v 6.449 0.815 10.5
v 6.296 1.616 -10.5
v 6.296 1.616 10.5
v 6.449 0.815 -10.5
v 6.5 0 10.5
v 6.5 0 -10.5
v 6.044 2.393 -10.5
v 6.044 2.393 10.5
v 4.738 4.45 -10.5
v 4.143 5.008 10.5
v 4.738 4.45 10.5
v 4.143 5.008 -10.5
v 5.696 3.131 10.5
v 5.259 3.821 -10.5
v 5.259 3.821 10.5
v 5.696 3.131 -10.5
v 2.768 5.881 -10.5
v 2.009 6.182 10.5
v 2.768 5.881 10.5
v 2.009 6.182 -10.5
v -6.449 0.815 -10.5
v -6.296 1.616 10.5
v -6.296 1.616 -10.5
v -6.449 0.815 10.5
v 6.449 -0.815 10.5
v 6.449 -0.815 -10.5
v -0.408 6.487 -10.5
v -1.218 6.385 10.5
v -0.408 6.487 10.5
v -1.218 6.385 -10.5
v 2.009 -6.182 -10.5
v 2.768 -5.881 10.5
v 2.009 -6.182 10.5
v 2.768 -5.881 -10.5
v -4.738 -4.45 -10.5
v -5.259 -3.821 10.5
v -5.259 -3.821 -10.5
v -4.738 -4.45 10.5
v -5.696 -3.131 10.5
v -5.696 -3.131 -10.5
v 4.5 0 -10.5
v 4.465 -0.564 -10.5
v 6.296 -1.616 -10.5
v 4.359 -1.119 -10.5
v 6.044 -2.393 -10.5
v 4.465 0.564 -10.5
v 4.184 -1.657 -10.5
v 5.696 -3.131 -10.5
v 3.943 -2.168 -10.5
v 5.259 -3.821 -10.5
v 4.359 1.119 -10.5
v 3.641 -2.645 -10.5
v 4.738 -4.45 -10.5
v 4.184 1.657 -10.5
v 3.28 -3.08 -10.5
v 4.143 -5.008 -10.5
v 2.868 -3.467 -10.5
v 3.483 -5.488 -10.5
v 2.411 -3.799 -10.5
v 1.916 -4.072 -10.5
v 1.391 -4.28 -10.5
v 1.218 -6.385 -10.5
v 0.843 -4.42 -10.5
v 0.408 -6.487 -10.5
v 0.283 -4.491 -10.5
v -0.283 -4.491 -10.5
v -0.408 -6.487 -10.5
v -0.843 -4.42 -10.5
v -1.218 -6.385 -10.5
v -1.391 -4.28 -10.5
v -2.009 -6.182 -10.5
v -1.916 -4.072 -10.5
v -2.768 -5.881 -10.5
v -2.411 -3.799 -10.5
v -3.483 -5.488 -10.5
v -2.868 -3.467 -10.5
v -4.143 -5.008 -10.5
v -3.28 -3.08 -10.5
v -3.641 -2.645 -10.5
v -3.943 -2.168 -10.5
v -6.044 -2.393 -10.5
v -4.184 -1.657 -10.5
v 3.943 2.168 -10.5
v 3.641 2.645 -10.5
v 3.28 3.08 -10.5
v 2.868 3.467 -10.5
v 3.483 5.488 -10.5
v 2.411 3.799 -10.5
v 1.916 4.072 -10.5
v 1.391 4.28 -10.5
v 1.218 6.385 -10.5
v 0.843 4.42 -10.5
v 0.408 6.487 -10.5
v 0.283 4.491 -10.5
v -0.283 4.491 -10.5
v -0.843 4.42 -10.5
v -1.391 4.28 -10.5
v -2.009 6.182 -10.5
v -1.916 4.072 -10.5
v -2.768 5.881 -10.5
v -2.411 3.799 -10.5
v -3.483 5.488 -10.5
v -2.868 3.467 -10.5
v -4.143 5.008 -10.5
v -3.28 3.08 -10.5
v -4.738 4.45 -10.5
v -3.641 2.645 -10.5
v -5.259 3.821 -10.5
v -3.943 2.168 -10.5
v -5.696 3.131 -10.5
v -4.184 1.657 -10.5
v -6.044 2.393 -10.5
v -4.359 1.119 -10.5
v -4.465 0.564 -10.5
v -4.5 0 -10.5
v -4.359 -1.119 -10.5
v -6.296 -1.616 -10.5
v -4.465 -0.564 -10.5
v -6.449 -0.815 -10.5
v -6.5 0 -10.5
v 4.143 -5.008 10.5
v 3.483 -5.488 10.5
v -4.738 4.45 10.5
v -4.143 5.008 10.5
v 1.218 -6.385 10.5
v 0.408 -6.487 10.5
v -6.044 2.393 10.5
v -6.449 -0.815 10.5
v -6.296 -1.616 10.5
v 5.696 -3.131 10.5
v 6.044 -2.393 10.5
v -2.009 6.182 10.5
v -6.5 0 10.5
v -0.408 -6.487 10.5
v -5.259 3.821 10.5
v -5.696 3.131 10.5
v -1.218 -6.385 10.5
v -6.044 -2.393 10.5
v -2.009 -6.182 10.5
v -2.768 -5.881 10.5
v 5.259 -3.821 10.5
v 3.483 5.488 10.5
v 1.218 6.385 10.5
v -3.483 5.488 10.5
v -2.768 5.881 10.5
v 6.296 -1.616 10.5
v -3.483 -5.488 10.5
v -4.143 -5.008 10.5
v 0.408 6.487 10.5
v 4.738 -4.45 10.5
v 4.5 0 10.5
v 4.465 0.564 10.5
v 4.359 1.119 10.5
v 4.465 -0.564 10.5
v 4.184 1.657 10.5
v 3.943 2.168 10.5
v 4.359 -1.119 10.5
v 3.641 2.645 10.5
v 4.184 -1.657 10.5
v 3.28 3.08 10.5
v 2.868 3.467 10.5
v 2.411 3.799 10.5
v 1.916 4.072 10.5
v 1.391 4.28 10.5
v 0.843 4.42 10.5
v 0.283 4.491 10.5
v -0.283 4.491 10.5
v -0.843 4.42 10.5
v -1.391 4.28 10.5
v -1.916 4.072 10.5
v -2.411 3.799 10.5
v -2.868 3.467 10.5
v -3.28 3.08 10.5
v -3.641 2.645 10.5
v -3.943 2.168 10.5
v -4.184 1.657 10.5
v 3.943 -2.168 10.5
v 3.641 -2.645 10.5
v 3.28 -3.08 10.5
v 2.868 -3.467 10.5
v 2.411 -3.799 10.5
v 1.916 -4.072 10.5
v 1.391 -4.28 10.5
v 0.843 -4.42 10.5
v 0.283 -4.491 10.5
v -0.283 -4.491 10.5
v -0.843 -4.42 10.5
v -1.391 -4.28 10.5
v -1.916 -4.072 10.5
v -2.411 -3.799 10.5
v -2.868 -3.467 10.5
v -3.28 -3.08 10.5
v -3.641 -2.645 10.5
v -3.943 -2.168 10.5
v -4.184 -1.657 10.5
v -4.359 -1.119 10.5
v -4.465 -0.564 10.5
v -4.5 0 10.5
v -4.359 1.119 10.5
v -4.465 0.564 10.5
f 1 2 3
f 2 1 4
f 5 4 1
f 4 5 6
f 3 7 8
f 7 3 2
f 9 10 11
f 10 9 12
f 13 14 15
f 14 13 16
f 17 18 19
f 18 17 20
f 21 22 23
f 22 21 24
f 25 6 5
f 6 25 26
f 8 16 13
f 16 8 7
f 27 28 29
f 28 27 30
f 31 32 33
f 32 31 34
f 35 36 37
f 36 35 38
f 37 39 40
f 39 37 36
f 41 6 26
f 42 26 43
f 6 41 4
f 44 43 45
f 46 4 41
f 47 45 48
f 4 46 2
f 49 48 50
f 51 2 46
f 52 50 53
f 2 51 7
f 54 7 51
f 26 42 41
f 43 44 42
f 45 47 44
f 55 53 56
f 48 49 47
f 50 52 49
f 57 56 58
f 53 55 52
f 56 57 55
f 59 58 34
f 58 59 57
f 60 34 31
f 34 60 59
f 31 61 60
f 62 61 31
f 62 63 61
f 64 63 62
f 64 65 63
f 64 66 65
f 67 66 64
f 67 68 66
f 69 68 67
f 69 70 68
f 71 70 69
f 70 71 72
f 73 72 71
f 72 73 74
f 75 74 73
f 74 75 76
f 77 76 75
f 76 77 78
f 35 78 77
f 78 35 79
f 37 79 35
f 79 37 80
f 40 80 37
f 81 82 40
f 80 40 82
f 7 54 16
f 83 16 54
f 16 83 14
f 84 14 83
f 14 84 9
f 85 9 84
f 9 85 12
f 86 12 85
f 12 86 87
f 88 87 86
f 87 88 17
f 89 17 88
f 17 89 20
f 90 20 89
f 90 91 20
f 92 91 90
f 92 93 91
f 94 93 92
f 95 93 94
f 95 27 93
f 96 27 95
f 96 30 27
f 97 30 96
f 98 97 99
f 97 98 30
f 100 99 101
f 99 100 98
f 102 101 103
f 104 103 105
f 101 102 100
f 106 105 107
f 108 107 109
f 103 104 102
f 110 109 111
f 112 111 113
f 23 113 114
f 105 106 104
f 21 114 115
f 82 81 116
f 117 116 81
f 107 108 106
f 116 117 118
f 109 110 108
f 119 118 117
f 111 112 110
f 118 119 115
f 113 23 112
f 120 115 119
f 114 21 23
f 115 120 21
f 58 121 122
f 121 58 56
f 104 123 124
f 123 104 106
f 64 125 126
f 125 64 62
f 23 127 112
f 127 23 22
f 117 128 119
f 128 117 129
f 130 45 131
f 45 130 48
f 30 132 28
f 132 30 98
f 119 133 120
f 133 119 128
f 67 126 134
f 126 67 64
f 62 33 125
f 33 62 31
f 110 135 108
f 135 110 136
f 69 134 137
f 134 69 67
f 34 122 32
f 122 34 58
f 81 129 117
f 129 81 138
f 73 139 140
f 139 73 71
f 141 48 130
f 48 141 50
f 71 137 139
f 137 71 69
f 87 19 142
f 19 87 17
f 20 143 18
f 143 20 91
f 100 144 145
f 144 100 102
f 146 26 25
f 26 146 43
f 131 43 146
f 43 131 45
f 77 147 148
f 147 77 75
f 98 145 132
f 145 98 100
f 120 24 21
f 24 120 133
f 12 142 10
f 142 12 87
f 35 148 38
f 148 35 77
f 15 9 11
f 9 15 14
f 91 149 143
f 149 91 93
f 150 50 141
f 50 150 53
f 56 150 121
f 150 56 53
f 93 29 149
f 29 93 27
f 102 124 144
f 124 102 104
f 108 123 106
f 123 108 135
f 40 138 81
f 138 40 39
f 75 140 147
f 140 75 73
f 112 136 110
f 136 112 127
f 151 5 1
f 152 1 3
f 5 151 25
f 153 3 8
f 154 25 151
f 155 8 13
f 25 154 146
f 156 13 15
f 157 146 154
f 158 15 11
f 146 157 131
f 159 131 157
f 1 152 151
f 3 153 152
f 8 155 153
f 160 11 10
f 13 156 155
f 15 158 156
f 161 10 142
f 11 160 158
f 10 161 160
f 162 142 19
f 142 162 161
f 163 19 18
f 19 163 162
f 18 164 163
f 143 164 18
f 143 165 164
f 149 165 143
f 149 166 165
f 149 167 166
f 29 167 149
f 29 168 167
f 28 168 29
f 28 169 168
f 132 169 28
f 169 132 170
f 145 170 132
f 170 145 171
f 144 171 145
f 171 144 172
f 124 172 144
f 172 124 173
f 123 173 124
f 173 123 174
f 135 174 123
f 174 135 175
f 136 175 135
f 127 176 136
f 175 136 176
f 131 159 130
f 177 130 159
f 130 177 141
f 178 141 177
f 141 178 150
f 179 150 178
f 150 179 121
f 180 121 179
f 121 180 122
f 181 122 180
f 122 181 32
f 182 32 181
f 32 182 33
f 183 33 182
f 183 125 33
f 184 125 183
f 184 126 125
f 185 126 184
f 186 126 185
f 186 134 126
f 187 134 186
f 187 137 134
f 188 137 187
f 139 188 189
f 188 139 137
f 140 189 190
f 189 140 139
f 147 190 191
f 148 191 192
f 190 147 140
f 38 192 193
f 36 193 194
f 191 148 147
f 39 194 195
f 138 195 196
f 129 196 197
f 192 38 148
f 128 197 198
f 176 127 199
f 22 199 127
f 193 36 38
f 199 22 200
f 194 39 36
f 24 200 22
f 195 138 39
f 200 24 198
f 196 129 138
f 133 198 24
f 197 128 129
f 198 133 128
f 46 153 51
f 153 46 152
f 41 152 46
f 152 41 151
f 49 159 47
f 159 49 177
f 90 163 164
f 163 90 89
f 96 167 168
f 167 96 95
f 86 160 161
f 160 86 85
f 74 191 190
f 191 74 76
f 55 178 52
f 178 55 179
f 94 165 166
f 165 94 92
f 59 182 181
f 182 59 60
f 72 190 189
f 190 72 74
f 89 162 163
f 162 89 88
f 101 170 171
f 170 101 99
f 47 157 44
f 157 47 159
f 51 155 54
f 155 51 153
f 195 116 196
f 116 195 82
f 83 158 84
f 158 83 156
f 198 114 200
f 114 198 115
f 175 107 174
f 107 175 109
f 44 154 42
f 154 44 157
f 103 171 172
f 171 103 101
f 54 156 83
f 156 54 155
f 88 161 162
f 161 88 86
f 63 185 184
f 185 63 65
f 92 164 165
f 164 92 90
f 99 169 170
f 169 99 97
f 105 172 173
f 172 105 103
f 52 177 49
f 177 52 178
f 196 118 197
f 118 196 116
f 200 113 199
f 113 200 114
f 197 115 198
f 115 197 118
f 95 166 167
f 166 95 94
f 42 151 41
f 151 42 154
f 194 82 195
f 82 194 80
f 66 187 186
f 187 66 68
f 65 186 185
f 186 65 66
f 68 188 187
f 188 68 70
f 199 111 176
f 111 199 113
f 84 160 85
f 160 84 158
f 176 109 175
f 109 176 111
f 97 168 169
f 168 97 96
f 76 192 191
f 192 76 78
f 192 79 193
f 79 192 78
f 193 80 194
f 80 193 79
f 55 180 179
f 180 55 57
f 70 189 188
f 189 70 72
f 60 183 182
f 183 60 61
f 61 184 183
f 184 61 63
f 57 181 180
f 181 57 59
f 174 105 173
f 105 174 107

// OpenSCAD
$fn = 50;


difference() {
	union() {
		translate(v = [0, 0, -10.5000000000]) {
			cylinder(h = 21, r = 6.5000000000);
		}
	}
	union() {
		translate(v = [0, 0, -100.0000000000]) {
			cylinder(h = 200, r = 4.5000000000);
		}
	}
}
